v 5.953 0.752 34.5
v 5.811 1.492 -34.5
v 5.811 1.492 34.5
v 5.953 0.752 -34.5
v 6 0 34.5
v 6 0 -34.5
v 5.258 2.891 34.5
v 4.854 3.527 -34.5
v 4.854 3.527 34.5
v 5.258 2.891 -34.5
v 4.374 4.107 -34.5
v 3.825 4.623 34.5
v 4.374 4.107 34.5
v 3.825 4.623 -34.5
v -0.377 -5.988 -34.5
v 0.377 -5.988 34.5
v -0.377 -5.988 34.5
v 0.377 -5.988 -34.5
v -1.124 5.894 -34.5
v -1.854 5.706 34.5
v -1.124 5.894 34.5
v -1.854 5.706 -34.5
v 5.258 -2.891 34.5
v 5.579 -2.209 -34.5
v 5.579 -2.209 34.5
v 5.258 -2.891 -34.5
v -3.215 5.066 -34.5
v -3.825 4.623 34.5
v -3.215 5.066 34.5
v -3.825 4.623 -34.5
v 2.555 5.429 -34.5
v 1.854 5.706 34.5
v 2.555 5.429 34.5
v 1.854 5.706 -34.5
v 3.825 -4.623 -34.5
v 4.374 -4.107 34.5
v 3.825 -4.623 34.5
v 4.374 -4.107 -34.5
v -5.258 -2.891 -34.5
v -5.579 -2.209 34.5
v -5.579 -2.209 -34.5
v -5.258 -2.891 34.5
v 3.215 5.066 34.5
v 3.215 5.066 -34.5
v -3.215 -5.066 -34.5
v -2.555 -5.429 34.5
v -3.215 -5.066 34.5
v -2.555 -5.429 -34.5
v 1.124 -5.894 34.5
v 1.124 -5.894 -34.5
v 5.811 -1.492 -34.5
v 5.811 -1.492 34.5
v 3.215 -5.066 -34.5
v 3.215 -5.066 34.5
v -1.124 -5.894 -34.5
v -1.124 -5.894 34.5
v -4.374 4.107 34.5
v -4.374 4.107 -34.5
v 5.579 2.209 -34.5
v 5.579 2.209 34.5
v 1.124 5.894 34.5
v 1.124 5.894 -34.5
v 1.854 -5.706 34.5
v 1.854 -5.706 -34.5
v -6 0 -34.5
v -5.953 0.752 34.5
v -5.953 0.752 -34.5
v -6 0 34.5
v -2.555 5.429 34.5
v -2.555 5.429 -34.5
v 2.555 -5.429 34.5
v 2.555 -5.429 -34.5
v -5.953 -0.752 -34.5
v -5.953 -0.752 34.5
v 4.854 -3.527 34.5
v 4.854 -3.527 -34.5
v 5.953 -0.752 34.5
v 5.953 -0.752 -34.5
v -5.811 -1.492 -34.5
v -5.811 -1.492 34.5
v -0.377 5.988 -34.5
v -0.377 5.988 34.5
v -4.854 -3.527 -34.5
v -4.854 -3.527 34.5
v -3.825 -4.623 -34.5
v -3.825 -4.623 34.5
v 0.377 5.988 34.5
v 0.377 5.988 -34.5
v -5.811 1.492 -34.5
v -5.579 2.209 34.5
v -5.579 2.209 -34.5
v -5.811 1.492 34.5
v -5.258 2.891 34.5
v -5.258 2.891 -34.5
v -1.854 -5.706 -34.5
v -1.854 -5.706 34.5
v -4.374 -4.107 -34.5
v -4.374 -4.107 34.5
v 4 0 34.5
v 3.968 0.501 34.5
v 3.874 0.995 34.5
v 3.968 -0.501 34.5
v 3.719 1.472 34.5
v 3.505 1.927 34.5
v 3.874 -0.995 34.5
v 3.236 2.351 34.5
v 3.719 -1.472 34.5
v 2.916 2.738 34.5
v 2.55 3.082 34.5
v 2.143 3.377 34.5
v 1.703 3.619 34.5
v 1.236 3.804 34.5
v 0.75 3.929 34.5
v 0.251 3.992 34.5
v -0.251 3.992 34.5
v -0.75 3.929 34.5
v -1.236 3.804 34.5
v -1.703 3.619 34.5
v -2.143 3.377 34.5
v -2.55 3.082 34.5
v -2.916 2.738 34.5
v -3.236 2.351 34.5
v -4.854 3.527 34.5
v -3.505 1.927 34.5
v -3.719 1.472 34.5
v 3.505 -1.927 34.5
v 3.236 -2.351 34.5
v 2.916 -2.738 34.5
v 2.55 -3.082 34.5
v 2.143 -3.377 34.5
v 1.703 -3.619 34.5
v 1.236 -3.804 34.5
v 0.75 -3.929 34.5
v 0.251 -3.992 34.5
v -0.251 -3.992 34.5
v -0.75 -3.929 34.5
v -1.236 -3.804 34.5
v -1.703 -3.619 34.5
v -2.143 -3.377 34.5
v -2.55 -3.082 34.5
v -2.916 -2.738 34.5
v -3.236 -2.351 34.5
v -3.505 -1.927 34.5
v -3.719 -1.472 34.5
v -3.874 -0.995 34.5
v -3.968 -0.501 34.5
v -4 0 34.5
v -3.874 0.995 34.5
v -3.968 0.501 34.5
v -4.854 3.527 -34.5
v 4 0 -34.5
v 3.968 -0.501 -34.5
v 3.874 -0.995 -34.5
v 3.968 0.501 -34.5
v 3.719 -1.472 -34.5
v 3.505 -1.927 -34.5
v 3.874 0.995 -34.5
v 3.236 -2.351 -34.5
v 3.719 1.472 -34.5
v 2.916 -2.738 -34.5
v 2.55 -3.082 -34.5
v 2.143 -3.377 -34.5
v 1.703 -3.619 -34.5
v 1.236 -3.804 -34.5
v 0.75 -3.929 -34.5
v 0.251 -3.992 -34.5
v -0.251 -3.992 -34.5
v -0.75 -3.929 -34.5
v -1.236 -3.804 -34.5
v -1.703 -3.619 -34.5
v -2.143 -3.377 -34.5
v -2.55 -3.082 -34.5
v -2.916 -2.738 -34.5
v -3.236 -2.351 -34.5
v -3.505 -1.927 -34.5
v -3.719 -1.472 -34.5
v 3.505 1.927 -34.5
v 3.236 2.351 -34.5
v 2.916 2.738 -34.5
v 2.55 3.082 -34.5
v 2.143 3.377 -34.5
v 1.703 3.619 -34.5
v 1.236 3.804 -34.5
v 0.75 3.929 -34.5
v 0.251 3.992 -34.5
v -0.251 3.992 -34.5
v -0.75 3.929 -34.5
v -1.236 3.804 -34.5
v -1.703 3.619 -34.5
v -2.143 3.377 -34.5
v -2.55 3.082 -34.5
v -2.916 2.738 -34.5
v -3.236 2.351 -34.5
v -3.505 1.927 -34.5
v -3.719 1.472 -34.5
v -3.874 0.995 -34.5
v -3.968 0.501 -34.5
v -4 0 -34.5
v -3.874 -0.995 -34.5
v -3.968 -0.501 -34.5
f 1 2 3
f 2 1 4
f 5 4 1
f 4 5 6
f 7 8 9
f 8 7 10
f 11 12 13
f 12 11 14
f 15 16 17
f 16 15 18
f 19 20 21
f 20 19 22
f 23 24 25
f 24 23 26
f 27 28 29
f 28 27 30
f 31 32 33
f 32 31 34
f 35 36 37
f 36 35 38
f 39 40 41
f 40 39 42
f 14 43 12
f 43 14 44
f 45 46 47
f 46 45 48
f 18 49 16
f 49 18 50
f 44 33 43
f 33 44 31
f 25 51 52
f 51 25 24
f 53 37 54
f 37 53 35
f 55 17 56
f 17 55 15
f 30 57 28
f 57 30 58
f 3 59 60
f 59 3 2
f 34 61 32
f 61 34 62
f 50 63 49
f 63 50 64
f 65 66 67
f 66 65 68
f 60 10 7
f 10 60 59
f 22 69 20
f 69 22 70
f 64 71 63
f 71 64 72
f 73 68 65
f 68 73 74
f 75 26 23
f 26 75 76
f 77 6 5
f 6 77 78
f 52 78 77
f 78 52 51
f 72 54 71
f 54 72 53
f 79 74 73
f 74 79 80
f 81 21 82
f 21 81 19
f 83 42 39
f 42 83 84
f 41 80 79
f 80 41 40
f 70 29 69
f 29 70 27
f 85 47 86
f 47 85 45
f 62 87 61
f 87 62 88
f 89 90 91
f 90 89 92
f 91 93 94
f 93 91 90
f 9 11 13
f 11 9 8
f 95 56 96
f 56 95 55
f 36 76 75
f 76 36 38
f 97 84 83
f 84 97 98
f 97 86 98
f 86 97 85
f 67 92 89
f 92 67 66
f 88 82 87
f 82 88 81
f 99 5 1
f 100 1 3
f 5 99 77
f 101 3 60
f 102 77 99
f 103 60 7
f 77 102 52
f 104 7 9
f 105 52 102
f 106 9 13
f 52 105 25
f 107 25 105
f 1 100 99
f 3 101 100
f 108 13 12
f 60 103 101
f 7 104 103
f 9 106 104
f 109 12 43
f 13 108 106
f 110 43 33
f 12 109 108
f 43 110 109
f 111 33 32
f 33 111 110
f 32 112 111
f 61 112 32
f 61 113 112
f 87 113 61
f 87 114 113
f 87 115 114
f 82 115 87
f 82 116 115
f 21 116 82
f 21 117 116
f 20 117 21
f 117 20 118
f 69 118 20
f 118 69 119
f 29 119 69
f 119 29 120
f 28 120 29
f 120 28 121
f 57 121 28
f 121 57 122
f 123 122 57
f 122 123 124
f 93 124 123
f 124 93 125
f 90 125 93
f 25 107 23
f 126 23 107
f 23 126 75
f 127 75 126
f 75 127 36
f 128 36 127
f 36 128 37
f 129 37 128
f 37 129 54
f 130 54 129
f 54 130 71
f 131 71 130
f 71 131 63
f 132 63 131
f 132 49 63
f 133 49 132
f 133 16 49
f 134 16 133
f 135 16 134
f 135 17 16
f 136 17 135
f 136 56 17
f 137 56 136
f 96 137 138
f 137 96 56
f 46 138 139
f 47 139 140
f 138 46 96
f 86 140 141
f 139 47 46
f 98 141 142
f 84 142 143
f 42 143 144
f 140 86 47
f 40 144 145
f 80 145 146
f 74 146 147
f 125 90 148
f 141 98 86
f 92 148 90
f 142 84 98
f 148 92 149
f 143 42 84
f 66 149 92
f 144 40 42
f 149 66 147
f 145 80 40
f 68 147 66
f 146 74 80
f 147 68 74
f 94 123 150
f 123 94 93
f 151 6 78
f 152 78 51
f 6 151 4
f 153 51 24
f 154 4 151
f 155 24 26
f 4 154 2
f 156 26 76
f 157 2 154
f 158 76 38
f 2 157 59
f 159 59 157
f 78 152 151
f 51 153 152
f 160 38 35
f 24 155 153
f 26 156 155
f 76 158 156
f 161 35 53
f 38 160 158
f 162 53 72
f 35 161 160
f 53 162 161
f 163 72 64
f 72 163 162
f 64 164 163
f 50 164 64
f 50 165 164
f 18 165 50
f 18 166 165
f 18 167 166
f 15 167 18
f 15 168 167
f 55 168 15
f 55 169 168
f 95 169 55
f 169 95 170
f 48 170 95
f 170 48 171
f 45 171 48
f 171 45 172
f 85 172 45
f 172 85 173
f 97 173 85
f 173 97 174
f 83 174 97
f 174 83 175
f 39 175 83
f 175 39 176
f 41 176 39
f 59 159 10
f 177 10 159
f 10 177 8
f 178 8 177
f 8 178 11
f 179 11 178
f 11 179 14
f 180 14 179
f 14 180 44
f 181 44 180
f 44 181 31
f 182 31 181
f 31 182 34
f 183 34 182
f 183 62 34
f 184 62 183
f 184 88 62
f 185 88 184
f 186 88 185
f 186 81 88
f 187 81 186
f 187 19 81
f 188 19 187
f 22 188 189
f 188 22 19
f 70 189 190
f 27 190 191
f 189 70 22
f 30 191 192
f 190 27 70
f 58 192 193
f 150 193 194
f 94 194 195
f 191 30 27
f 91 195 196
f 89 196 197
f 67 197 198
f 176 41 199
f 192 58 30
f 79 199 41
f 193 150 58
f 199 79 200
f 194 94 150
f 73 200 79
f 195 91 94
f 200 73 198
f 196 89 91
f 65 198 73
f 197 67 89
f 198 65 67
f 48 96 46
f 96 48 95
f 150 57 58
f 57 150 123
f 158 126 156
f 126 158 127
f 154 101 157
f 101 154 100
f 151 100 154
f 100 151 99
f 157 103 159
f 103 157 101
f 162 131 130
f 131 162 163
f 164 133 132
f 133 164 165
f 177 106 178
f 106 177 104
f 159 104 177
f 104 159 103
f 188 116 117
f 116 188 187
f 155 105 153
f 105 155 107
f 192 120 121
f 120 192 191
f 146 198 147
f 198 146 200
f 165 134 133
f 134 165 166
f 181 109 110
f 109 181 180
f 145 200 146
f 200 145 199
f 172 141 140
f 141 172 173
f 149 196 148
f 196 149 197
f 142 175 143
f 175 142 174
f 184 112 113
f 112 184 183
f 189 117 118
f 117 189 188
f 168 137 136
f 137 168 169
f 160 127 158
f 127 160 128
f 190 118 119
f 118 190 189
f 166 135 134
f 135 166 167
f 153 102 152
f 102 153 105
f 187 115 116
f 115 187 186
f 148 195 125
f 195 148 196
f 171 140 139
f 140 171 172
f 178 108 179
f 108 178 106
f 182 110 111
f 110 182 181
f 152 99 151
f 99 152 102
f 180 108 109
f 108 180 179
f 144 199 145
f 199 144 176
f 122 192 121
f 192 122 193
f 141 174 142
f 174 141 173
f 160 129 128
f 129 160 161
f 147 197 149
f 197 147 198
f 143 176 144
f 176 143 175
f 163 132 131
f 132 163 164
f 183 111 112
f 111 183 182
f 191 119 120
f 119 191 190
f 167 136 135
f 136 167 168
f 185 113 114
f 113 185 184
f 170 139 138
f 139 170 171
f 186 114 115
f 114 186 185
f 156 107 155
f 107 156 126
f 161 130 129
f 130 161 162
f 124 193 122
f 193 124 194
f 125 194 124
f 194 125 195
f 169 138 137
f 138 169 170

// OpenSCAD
$fn = 50;


difference() {
	union() {
		translate(v = [0, 0, -34.5000000000]) {
			cylinder(h = 69, r = 6.0000000000);
		}
	}
	union() {
		translate(v = [0, 0, -100.0000000000]) {
			cylinder(h = 200, r = 4.0000000000);
		}
	}
}
